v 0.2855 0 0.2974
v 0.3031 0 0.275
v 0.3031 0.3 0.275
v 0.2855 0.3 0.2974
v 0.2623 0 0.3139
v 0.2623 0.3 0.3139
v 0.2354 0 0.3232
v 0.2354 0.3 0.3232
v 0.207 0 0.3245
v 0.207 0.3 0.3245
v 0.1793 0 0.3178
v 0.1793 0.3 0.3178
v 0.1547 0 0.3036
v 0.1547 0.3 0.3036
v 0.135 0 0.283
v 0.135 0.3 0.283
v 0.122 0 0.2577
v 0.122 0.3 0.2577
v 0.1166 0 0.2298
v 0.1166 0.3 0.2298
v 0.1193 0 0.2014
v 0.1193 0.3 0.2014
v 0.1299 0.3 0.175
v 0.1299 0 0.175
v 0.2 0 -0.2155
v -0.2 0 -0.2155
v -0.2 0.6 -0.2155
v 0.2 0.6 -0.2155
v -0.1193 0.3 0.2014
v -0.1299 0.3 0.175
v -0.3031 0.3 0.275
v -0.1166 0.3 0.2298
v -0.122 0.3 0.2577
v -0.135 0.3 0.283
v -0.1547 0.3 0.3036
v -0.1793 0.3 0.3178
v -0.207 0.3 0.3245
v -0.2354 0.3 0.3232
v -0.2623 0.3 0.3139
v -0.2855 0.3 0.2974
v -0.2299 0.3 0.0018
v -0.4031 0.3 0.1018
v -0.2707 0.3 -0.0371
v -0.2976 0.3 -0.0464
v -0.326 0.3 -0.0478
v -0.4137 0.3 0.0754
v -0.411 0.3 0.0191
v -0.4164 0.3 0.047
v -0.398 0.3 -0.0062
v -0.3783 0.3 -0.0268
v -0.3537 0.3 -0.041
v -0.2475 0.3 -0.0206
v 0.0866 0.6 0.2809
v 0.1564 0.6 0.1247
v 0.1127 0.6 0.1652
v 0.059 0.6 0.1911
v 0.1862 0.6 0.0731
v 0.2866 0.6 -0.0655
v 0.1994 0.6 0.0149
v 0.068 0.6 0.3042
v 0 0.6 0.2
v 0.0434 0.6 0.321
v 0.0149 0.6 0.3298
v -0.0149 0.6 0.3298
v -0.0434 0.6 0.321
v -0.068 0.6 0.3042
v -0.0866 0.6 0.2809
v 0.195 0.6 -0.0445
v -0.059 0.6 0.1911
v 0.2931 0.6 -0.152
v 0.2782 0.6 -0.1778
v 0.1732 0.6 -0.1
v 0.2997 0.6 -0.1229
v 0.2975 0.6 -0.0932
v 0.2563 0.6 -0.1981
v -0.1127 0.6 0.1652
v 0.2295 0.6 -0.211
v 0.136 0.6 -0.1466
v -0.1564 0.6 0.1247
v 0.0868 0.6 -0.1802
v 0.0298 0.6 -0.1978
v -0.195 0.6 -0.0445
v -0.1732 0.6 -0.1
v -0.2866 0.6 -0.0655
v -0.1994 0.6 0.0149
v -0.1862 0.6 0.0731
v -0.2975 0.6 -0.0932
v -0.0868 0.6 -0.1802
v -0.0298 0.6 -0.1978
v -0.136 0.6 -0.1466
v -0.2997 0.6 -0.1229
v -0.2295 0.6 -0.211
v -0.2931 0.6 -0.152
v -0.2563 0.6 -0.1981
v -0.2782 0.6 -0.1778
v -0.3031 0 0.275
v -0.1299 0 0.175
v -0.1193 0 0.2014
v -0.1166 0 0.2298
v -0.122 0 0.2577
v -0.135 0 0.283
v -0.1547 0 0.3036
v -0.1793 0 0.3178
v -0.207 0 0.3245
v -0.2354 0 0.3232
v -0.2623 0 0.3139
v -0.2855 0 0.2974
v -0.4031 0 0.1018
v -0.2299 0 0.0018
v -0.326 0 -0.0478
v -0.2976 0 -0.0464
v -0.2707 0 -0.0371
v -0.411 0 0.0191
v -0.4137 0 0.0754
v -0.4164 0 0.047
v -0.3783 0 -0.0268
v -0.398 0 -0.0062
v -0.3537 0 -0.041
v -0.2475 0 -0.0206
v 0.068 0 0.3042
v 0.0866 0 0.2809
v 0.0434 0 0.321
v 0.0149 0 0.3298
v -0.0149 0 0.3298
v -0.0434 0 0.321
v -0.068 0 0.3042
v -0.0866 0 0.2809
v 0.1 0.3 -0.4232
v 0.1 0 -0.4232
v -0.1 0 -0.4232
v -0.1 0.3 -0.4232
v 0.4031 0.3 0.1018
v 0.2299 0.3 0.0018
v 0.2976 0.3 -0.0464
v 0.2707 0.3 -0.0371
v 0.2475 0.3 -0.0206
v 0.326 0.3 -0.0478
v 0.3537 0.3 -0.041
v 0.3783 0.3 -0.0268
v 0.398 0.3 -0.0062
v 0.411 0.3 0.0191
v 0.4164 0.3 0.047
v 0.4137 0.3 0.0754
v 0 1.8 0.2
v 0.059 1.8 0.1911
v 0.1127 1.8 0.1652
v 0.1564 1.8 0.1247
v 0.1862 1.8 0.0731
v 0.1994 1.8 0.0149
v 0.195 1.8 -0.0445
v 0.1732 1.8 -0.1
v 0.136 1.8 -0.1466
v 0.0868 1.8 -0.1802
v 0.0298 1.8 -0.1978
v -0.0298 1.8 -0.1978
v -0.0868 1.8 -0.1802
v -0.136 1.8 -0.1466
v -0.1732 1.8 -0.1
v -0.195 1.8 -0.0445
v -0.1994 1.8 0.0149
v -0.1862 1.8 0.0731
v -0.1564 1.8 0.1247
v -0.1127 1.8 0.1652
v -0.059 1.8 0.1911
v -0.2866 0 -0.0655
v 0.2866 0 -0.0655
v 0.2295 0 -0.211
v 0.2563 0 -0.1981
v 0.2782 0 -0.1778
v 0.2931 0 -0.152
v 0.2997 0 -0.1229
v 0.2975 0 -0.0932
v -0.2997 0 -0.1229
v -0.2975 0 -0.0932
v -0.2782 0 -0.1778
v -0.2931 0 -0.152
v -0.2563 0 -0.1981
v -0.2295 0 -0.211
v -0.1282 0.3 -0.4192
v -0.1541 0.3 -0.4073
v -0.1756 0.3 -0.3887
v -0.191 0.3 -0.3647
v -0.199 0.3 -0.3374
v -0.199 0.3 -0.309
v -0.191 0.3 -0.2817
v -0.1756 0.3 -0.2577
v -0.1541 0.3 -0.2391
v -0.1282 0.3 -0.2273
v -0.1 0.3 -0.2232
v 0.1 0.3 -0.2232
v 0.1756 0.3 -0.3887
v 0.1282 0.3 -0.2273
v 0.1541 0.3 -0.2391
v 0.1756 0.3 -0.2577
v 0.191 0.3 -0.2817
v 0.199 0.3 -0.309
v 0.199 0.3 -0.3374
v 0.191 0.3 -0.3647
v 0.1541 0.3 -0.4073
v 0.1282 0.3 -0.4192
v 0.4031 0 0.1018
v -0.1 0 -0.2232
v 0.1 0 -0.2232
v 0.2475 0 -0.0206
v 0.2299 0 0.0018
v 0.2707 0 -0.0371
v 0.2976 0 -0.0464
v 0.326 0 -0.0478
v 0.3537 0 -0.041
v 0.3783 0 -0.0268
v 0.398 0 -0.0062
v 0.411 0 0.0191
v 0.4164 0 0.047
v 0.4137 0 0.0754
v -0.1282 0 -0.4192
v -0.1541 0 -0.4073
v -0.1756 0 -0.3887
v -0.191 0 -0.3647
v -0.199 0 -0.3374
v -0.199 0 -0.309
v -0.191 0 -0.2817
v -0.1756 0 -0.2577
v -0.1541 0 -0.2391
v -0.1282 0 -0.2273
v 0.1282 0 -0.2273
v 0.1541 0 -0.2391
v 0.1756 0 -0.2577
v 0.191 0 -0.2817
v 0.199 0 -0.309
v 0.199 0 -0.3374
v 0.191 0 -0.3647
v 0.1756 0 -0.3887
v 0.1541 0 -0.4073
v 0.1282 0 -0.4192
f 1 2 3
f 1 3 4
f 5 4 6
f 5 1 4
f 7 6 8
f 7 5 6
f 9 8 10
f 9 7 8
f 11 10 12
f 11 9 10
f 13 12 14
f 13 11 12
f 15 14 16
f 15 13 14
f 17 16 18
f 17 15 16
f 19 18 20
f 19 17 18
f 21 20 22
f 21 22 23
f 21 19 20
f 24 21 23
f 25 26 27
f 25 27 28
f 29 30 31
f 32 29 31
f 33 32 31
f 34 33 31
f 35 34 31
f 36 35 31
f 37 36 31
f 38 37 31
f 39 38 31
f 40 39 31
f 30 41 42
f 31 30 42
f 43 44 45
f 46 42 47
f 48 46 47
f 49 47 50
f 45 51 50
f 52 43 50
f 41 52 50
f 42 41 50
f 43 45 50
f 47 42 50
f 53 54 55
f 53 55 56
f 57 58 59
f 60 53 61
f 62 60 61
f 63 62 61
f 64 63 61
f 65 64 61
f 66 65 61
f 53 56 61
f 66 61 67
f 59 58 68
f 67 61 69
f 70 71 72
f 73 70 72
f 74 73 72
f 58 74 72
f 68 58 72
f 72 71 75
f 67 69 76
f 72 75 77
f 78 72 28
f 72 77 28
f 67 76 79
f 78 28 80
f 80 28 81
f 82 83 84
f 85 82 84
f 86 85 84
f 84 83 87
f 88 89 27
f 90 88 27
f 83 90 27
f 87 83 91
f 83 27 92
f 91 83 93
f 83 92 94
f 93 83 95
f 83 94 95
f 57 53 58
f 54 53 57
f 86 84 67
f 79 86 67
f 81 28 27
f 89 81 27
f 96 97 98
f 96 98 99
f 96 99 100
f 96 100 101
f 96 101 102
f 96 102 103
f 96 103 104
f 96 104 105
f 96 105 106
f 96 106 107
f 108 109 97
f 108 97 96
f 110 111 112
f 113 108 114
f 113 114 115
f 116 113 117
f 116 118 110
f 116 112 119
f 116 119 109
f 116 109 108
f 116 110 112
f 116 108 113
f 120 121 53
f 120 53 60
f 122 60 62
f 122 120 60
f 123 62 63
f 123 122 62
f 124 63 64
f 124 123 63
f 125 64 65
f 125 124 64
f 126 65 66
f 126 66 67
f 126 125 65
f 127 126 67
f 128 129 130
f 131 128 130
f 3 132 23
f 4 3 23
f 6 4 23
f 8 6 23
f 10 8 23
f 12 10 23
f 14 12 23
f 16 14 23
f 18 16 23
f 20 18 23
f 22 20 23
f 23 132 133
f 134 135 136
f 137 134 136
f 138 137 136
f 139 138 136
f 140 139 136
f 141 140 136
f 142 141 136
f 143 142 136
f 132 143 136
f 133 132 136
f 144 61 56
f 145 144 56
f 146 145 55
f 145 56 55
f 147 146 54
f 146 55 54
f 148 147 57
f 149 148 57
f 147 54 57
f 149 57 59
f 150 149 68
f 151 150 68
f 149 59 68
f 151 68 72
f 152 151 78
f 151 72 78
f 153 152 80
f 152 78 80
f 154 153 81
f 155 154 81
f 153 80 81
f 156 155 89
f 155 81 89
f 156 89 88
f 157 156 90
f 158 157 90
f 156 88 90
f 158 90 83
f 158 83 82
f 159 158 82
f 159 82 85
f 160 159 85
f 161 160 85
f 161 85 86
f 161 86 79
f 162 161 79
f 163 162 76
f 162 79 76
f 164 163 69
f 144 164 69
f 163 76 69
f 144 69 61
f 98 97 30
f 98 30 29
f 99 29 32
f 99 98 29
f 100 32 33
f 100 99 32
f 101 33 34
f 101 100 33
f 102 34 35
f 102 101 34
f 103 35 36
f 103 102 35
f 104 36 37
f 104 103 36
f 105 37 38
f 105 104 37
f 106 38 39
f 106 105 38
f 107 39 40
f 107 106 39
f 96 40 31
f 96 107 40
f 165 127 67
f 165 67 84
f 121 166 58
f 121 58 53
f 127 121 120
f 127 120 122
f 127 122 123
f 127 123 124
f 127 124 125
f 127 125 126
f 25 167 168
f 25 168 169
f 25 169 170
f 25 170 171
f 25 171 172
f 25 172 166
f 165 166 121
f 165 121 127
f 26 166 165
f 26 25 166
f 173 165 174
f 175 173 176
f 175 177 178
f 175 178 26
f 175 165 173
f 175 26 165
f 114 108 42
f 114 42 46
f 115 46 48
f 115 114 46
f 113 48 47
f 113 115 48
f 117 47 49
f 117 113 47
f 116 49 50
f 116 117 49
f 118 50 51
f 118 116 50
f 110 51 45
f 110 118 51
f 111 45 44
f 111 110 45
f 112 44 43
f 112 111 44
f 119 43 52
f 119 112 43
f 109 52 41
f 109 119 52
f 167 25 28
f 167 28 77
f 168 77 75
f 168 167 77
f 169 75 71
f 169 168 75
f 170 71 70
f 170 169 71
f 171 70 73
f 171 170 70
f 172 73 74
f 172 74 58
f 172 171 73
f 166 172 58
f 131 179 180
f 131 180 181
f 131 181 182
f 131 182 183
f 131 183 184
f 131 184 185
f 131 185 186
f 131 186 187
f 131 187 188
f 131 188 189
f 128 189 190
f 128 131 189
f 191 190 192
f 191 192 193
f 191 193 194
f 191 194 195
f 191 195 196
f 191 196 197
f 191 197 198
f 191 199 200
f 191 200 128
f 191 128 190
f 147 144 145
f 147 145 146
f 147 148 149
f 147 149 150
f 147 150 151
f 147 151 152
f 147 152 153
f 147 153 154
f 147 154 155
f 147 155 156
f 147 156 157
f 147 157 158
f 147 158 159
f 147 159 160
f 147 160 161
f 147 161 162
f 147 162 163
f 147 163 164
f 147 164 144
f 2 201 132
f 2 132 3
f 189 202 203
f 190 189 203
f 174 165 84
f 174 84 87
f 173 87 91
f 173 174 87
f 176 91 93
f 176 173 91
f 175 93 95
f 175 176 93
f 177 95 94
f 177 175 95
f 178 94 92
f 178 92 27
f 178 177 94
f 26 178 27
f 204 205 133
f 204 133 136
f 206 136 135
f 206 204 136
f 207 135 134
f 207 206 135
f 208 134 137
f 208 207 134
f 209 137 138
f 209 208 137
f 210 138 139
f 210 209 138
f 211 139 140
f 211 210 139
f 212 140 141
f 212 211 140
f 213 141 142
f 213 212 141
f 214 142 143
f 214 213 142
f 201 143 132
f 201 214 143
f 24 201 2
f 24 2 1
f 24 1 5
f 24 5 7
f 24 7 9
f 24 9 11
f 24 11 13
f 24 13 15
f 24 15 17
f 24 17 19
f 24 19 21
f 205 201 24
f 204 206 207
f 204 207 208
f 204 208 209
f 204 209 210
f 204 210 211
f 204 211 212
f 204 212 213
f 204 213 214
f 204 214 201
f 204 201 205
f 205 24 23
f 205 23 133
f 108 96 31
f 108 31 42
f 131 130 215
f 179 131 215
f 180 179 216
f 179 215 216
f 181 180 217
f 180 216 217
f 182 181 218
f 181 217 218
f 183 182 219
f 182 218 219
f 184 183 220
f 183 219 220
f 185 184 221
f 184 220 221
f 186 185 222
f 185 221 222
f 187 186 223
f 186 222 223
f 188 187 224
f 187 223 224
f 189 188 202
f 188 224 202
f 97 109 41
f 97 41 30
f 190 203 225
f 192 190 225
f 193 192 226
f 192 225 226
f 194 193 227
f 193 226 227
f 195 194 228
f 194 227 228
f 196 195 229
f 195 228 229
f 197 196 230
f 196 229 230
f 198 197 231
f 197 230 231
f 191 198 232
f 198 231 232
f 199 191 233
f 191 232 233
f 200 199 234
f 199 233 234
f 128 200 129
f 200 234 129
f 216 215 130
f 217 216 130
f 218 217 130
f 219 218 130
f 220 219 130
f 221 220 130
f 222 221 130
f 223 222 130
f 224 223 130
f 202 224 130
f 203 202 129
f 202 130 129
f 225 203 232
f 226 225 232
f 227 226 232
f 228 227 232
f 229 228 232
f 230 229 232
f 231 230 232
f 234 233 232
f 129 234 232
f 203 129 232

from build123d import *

# Parameters (mm, degrees)
BOSS_EXTRUDE1_DEPTH   = 0.6
BOSS_EXTRUDE2_DEPTH   = 0.3
BOSS_EXTRUDE2_2_DEPTH = 0.3
BOSS_EXTRUDE2_3_DEPTH = 0.3
SKETCH3_R             = 0.2
BOSS_EXTRUDE3_DEPTH   = 1.2


with BuildPart() as part:
    # Sketch1 → Boss-Extrude1 (new body)
    with BuildSketch(Plane(origin=(0, 0, 0), x_dir=(1, 0, 0), z_dir=(0, 1, 0))):
        with BuildLine():
            Line((0.28660254, 0.065470054), (0.08660254, -0.280940108))
            ThreePointArc((0.08660254, -0.280940108), (0, -0.330940108), (-0.08660254, -0.280940108))
            Line((-0.08660254, -0.280940108), (-0.28660254, 0.065470054))
            ThreePointArc((-0.28660254, 0.065470054), (-0.28660254, 0.165470054), (-0.2, 0.215470054))
            Line((-0.2, 0.215470054), (0.2, 0.215470054))
            ThreePointArc((0.2, 0.215470054), (0.28660254, 0.165470054), (0.28660254, 0.065470054))
        make_face()
    extrude(amount=BOSS_EXTRUDE1_DEPTH)

    # Sketch3 → Boss-Extrude3 (add)
    with BuildSketch(Plane(origin=(0, 0.6, 0), x_dir=(1, 0, 0), z_dir=(0, 1, 0))):
        with Locations(Location((0, 0, 0), (0, 0, 270))):
            Circle(SKETCH3_R)
    extrude(amount=BOSS_EXTRUDE3_DEPTH)


with BuildPart() as body_2:
    # Sketch2 → Boss-Extrude2 (new body)
    with BuildSketch(Plane(origin=(0, 0, 0), x_dir=(1, 0, 0), z_dir=(0, 1, 0))):
        with BuildLine():
            Line((0.403108891, -0.101794919), (0.303108891, -0.275))
            ThreePointArc((0.303108891, -0.275), (0.166506351, -0.31160254), (0.129903811, -0.175))
            Line((0.129903811, -0.175), (0.229903811, -0.001794919))
            ThreePointArc((0.229903811, -0.001794919), (0.366506351, 0.034807621), (0.403108891, -0.101794919))
        make_face()
    extrude(amount=BOSS_EXTRUDE2_DEPTH)


with BuildPart() as body_3:
    # Sketch2 → Boss-Extrude2 2 (new body)
    with BuildSketch(Plane(origin=(0, 0, 0), x_dir=(1, 0, 0), z_dir=(0, 1, 0))):
        with BuildLine():
            Line((0.1, 0.423205081), (-0.1, 0.423205081))
            ThreePointArc((-0.1, 0.423205081), (-0.2, 0.323205081), (-0.1, 0.223205081))
            Line((-0.1, 0.223205081), (0.1, 0.223205081))
            ThreePointArc((0.1, 0.223205081), (0.2, 0.323205081), (0.1, 0.423205081))
        make_face()
    extrude(amount=BOSS_EXTRUDE2_2_DEPTH)


with BuildPart() as body_4:
    # Sketch2 → Boss-Extrude2 3 (new body)
    with BuildSketch(Plane(origin=(0, 0, 0), x_dir=(1, 0, 0), z_dir=(0, 1, 0))):
        with BuildLine():
            Line((-0.303108891, -0.275), (-0.403108891, -0.101794919))
            ThreePointArc((-0.403108891, -0.101794919), (-0.366506351, 0.034807621), (-0.229903811, -0.001794919))
            Line((-0.229903811, -0.001794919), (-0.129903811, -0.175))
            ThreePointArc((-0.129903811, -0.175), (-0.166506351, -0.31160254), (-0.303108891, -0.275))
        make_face()
    extrude(amount=BOSS_EXTRUDE2_3_DEPTH)


solid = Compound([part.part, body_2.part, body_3.part, body_4.part])
